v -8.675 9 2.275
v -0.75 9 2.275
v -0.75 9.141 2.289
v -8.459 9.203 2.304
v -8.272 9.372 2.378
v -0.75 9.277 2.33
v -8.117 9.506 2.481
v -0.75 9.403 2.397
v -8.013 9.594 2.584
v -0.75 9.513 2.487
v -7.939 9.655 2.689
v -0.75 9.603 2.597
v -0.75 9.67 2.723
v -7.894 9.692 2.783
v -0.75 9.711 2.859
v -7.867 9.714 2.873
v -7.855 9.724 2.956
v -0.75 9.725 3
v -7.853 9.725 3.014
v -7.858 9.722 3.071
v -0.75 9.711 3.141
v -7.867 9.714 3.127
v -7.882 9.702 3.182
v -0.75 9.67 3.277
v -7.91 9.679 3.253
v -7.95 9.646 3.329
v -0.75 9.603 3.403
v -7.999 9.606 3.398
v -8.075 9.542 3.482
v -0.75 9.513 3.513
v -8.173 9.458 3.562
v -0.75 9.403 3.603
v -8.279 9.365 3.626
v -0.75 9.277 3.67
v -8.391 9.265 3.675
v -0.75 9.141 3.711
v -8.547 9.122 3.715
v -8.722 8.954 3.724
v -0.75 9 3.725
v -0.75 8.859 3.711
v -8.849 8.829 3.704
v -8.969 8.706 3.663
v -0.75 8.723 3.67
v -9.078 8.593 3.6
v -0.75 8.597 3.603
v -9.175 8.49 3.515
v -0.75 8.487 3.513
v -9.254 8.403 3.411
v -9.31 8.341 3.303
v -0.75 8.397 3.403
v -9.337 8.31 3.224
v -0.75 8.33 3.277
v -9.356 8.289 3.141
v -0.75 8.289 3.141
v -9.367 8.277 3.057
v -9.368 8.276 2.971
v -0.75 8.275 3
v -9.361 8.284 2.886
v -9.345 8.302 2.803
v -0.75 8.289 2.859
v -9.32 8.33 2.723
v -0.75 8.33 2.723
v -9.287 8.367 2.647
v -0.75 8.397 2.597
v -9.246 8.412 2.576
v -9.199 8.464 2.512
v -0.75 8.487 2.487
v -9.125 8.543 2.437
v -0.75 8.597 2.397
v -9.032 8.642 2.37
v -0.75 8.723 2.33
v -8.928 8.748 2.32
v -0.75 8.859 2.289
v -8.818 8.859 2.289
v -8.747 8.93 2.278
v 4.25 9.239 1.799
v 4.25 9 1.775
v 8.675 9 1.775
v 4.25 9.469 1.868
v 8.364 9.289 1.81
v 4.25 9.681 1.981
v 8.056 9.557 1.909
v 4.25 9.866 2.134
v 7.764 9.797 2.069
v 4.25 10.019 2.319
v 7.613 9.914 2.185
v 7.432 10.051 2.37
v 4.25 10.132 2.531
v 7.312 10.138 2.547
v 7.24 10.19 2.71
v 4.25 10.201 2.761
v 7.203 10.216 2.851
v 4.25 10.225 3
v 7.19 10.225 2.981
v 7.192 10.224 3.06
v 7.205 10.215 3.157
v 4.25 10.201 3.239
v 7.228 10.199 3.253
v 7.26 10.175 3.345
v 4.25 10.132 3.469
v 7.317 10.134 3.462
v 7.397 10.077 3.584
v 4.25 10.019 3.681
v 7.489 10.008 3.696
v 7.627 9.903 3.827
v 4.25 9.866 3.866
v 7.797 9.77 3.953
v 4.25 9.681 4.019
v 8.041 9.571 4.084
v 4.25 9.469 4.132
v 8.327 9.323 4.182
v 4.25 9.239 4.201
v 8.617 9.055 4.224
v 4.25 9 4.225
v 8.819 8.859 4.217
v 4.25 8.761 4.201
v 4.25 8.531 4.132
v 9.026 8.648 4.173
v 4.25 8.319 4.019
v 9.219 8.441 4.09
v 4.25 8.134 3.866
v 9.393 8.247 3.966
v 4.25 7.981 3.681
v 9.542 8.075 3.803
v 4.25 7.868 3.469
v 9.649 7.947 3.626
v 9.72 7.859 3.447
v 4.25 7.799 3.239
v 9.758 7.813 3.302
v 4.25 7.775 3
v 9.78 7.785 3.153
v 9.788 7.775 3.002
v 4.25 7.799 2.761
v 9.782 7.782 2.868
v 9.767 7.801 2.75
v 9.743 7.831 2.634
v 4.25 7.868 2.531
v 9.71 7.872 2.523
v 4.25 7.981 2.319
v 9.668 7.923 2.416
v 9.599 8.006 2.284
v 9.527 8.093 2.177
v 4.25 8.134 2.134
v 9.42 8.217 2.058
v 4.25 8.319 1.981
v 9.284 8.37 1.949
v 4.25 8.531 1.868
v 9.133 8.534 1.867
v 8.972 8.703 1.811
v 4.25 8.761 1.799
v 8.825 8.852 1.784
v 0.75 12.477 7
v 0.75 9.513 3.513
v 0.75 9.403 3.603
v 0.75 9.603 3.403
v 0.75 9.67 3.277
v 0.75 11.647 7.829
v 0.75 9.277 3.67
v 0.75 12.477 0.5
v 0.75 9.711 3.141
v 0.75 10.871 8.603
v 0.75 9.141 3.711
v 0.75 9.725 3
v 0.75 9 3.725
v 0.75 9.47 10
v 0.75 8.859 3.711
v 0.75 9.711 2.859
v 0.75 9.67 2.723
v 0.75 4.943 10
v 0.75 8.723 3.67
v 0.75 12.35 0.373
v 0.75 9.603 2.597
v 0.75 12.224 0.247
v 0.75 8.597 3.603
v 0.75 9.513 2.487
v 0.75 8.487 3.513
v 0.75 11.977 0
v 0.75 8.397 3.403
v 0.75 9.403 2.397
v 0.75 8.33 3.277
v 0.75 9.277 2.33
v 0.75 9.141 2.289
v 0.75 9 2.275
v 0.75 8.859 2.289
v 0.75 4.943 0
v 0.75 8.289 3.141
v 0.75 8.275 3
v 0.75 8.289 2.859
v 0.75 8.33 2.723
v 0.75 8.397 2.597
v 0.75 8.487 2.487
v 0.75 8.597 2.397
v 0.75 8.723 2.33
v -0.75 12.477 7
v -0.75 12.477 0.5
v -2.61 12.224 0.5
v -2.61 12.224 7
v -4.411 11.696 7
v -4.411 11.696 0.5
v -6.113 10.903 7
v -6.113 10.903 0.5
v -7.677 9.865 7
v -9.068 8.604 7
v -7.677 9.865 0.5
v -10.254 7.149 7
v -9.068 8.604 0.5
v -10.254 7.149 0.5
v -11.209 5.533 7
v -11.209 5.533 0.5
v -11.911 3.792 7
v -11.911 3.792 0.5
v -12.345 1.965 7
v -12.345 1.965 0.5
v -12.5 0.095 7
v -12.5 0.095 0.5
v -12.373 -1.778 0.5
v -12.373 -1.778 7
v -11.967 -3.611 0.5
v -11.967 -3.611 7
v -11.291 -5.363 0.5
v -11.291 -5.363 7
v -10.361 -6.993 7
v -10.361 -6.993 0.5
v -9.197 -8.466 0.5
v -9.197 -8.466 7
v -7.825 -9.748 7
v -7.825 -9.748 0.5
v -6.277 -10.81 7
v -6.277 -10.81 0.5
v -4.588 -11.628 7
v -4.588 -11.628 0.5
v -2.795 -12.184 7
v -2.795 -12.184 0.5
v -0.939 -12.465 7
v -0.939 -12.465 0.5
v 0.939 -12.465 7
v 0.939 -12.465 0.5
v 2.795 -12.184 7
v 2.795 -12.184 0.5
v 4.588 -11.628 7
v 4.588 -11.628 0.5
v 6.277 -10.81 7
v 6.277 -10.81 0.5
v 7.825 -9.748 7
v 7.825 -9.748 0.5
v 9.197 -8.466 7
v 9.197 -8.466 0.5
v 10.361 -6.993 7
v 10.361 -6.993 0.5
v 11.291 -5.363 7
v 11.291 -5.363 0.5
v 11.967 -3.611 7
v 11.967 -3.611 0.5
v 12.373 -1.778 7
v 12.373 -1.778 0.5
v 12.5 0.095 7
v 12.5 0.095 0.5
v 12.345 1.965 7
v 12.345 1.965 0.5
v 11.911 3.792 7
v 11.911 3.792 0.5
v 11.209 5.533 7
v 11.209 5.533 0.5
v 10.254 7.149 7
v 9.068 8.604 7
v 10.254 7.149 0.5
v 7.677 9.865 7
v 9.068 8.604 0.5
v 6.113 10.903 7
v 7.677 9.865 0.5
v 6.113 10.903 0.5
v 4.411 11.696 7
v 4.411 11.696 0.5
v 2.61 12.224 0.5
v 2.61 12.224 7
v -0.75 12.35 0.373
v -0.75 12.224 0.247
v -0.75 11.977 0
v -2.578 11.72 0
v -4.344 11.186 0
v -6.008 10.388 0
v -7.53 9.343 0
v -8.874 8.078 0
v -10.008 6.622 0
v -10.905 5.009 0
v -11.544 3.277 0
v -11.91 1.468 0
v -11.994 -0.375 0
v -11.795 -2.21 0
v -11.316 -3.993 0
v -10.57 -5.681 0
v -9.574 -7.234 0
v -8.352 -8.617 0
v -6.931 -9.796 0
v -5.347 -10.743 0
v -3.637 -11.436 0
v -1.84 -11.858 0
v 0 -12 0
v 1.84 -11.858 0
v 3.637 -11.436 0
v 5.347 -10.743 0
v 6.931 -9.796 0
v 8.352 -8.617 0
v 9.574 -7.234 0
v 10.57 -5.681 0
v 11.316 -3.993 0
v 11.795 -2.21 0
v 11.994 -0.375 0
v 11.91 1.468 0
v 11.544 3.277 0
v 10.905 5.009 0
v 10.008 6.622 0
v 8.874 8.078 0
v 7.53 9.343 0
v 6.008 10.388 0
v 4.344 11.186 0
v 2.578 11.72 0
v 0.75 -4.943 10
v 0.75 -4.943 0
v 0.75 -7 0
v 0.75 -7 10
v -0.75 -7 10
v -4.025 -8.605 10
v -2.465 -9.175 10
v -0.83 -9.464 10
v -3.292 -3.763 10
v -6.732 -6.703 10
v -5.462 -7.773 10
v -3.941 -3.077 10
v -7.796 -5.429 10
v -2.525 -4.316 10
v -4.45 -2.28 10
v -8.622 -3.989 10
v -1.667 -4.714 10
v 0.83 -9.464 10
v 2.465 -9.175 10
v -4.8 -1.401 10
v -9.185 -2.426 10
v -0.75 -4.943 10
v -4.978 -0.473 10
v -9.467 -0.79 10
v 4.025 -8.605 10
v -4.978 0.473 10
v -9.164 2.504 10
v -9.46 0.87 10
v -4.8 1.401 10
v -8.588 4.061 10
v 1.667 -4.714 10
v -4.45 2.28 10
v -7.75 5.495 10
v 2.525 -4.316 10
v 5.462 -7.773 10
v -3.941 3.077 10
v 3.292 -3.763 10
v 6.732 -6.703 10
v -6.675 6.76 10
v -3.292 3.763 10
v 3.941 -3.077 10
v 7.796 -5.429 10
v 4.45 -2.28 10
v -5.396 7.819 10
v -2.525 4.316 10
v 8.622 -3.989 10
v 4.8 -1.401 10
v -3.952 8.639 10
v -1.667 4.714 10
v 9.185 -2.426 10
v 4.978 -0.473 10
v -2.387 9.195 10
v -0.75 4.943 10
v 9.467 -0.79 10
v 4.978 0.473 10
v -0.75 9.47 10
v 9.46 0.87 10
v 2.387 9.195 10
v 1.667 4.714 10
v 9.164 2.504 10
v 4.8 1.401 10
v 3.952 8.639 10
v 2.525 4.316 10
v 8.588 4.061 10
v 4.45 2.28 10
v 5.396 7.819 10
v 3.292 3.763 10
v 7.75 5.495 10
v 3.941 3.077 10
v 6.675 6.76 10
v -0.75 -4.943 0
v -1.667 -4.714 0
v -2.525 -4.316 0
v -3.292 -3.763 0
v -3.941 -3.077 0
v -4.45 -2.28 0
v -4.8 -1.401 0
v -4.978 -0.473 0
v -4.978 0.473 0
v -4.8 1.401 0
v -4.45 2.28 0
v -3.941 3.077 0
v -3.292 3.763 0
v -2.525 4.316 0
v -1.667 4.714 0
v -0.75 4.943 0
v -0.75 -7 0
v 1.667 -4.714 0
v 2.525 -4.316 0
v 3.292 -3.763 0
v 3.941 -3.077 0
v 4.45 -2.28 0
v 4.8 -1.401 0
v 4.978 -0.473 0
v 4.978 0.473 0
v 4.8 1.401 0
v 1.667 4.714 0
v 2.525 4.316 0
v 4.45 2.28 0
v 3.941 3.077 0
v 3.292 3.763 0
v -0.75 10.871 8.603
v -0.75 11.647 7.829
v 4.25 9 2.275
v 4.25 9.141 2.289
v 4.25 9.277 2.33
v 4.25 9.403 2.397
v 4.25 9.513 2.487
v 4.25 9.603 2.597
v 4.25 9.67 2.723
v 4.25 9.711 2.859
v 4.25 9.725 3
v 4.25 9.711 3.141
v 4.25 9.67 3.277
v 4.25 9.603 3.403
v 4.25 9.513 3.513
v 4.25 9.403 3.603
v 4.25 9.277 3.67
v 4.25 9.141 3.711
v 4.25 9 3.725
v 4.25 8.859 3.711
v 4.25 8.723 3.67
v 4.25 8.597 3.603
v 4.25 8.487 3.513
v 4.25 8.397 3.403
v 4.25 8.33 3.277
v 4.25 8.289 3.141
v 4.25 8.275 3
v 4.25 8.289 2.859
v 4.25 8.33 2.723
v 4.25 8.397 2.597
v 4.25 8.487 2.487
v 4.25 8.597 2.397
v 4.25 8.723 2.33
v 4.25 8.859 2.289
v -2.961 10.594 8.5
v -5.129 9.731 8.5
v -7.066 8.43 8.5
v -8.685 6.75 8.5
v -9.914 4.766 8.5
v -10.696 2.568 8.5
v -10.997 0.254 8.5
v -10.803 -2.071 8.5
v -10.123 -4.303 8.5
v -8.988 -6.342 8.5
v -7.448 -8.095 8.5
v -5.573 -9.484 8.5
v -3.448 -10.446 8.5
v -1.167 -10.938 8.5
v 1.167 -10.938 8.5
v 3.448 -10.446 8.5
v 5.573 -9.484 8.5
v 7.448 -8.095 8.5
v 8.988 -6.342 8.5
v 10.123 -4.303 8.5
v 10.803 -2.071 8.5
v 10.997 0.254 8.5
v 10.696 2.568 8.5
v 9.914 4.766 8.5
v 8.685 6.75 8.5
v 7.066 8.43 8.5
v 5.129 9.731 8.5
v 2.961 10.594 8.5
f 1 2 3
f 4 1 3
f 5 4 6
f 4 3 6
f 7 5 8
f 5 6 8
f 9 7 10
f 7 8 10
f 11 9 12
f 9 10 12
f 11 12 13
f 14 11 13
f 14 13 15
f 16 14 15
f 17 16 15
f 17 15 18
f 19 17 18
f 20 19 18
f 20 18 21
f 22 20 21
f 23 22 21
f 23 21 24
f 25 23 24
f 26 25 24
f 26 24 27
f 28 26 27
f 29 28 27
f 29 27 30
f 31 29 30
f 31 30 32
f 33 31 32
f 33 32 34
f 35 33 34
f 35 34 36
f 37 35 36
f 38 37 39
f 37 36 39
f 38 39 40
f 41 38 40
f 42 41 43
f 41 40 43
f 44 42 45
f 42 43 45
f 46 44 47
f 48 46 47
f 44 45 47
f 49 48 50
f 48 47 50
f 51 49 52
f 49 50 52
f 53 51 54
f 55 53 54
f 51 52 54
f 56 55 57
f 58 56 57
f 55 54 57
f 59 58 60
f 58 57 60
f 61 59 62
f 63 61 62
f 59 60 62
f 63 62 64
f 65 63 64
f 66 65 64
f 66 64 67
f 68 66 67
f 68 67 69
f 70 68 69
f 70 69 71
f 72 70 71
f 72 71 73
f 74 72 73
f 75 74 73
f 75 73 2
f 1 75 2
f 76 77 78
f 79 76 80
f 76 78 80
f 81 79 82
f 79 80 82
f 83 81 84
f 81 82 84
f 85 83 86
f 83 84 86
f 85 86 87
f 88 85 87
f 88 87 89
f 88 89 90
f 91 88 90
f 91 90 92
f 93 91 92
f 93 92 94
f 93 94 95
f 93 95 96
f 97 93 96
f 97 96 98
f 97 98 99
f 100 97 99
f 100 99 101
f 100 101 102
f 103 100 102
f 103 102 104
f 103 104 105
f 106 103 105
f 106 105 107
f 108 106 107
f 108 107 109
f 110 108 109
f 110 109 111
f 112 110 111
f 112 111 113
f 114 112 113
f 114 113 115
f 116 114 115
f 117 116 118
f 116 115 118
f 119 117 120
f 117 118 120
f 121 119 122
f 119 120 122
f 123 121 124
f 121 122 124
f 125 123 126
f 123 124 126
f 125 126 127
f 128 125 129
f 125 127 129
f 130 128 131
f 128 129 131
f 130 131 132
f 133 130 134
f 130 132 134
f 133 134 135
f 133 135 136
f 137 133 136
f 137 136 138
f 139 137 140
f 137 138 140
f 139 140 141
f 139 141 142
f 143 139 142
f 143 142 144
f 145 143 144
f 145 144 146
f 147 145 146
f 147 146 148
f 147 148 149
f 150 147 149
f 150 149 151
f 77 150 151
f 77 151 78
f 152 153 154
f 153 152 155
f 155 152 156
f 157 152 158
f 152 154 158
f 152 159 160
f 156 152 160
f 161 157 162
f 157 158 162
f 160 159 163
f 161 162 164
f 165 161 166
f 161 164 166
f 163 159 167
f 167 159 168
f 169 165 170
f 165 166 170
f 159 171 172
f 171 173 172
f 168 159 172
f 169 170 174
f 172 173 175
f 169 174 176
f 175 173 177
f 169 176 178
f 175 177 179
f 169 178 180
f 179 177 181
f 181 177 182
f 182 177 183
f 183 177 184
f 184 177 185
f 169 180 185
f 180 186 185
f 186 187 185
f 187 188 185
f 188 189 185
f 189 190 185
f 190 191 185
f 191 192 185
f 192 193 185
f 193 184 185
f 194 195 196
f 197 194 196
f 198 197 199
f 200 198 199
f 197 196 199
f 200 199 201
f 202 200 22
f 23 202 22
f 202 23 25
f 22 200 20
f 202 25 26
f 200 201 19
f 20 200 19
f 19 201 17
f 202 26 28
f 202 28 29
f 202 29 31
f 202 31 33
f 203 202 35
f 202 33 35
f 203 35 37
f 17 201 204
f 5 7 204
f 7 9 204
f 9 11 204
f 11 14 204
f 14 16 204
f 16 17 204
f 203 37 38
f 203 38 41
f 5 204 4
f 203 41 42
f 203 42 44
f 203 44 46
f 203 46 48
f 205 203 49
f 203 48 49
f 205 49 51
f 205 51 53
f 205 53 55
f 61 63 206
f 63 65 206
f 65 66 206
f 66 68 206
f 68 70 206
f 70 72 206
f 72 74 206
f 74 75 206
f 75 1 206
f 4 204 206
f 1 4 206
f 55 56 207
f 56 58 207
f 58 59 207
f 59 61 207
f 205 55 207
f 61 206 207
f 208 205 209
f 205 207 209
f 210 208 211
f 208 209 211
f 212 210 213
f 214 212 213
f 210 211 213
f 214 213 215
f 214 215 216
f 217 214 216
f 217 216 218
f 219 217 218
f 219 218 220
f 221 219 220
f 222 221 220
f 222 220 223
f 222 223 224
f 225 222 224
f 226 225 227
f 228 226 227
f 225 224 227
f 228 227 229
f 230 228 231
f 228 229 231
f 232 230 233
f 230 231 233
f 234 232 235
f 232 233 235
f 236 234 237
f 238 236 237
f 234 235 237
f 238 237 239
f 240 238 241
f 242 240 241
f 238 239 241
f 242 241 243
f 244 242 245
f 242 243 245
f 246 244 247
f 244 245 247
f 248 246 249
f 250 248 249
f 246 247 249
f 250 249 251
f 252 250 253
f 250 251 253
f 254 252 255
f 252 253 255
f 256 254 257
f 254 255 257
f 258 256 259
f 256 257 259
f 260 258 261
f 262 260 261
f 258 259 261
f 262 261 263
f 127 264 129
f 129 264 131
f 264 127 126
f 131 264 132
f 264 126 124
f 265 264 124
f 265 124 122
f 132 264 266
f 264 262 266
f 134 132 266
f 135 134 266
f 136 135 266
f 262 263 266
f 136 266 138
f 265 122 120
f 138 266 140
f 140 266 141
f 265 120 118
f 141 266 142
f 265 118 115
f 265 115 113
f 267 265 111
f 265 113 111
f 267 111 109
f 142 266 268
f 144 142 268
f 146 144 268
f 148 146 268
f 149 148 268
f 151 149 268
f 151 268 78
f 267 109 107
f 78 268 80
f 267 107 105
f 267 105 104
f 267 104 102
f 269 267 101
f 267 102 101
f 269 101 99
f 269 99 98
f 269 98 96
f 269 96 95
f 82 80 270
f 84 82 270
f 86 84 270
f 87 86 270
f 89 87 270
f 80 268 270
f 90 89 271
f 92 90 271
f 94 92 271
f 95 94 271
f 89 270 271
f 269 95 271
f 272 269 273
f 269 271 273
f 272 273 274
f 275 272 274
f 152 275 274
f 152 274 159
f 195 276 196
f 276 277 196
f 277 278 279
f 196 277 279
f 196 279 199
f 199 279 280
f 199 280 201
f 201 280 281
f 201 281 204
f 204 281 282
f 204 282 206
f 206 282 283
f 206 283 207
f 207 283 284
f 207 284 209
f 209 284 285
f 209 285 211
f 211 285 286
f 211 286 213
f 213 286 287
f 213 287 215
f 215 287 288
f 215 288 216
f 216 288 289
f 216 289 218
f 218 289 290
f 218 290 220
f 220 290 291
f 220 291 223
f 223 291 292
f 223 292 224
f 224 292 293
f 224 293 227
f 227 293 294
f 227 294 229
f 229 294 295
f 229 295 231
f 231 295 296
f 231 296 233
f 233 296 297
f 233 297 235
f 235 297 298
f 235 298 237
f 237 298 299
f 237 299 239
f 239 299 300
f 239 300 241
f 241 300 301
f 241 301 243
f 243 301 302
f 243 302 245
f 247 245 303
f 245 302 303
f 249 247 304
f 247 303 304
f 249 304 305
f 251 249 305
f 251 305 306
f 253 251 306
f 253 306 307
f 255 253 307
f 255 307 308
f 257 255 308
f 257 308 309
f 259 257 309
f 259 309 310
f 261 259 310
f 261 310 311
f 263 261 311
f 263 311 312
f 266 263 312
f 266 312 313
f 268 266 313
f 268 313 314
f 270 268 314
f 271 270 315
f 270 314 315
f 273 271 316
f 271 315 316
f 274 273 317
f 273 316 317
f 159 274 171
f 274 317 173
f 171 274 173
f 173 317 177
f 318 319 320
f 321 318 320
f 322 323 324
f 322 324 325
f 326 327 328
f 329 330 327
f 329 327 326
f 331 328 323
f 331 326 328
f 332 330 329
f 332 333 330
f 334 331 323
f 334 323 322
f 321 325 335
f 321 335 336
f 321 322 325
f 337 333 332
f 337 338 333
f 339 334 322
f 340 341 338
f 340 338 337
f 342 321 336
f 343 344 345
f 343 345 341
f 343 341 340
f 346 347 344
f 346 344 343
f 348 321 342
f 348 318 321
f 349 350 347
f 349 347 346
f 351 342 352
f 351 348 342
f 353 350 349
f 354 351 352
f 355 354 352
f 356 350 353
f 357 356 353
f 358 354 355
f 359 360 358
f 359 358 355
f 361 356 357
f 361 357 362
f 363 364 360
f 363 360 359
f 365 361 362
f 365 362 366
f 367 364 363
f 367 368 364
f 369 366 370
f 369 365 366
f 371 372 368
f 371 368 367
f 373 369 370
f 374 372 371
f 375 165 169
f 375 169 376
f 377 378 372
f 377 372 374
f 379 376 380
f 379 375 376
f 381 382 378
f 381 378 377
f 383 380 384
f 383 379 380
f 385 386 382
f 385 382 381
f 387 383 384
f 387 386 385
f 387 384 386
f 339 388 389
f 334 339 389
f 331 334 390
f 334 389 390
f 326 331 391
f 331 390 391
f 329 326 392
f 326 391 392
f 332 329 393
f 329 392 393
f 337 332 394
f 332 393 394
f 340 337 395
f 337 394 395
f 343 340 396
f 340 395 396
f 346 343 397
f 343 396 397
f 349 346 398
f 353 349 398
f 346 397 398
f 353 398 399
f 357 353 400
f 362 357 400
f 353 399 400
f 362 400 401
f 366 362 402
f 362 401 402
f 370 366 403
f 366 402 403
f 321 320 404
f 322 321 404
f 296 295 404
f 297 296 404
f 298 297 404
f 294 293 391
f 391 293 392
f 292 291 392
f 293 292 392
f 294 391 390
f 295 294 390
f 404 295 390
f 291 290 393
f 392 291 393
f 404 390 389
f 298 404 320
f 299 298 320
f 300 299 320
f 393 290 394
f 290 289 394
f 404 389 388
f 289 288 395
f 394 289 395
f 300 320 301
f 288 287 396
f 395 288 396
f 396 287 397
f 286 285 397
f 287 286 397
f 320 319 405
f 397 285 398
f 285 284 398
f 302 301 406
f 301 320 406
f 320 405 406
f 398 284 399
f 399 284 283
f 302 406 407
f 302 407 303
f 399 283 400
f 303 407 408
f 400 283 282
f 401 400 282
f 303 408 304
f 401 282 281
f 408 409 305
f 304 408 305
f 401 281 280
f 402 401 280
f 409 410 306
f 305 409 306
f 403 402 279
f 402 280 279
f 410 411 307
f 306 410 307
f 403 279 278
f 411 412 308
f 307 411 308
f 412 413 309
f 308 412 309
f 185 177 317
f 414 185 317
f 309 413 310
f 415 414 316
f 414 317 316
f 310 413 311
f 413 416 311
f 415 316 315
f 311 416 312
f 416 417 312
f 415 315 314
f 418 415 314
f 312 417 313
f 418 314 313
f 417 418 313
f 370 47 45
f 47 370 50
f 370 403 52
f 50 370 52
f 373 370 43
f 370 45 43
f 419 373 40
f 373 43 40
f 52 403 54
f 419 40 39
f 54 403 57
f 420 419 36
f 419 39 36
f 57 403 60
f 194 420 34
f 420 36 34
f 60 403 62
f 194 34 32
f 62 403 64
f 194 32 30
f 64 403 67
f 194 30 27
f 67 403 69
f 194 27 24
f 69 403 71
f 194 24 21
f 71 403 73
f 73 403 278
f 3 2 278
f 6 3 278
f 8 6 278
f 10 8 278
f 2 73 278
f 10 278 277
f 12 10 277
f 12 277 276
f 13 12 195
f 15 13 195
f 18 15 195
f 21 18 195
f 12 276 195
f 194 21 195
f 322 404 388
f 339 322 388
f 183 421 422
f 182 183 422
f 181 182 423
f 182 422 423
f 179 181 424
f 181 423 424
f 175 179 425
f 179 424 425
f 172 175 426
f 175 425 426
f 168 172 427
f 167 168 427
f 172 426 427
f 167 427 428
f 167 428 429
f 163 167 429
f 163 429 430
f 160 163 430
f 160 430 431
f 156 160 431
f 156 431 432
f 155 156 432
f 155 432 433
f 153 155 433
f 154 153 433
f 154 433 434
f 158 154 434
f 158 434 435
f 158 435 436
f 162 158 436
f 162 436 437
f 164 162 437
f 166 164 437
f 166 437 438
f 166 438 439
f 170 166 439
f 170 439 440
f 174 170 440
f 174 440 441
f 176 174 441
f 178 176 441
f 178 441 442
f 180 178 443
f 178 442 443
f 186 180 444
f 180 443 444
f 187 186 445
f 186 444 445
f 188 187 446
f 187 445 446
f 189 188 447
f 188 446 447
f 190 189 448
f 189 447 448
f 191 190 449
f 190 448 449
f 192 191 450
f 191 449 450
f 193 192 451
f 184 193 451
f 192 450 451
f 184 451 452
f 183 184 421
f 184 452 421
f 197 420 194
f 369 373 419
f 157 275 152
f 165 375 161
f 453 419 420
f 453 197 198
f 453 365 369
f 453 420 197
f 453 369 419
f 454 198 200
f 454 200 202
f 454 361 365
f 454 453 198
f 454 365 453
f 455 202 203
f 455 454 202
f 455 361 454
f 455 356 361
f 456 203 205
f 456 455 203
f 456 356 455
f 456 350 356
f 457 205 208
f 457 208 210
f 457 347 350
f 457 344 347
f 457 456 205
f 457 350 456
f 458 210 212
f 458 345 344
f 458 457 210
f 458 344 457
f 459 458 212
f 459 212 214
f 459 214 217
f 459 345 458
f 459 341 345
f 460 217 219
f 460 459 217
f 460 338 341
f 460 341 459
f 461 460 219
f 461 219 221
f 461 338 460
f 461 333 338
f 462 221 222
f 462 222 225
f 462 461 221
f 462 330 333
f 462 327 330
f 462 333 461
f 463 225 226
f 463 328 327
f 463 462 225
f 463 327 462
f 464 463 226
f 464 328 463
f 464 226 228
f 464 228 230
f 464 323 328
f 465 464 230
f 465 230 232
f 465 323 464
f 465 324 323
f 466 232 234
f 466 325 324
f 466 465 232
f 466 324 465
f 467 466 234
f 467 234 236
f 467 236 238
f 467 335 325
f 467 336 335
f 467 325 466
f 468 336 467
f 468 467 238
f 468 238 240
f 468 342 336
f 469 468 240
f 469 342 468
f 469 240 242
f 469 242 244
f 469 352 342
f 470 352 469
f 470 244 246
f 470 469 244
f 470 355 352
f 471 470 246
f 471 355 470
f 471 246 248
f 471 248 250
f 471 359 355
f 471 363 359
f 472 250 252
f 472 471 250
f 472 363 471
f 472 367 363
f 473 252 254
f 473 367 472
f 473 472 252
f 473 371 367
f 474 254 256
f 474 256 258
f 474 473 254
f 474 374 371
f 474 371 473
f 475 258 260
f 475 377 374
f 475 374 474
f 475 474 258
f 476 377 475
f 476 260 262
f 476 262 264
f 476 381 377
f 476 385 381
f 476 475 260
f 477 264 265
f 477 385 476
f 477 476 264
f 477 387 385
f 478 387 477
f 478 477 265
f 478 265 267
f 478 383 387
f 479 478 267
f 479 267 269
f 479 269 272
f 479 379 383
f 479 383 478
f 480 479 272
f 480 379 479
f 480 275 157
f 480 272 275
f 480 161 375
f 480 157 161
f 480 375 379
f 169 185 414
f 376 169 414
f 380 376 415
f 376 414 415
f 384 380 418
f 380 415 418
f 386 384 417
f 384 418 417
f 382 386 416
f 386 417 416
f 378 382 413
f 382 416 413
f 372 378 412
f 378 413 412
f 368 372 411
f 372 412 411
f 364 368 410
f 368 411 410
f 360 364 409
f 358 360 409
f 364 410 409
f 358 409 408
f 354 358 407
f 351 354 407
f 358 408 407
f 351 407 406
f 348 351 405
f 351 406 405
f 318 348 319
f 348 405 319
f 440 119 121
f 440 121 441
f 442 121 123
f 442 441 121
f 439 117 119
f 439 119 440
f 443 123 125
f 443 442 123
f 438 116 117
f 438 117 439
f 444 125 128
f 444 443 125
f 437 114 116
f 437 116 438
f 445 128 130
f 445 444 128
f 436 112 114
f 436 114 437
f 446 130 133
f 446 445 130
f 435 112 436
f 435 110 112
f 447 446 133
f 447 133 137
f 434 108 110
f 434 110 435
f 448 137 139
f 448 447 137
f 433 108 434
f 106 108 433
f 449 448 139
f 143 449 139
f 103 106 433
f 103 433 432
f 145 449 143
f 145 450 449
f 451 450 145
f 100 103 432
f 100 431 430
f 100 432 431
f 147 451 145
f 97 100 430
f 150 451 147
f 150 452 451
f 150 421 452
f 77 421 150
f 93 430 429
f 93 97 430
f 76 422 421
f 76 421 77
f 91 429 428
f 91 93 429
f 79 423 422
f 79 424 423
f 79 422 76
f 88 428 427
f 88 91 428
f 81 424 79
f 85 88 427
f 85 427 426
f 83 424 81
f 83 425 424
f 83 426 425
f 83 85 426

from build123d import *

# Parameters (mm, degrees)
BOSS_EXTRUDE1_DEPTH = 10
CHAMFER1_SIZE       = 3
CHAMFER2_SIZE       = 0.5
SKETCH22_R          = 1.225
CUT_EXTRUDE1_DEPTH  = 10
SKETCH23_R          = 0.725
CUT_EXTRUDE2_DEPTH  = 27.7500001


with BuildPart() as part:
    # Sketch1 → Boss-Extrude1 (new body)
    with BuildSketch(Plane.XY):
        with BuildLine():
            Line((-0.75, 4.943429983), (-0.75, 12.477479713))
            ThreePointArc((-0.75, 12.477479713), (0, -12.5), (0.75, 12.477479713))
            Line((0.75, 12.477479713), (0.75, 4.943429983))
            ThreePointArc((0.75, 4.943429983), (5, 0), (0.75, -4.943429983))
            Line((0.75, -4.943429983), (0.75, -7))
            Line((0.75, -7), (-0.75, -7))
            Line((-0.75, -7), (-0.75, -4.943429983))
            ThreePointArc((-0.75, -4.943429983), (-5, 0), (-0.75, 4.943429983))
        make_face()
    extrude(amount=BOSS_EXTRUDE1_DEPTH)

    # Chamfer1
    chamfer1_edges = [part.edges().sort_by_distance(p)[0] for p in [
        (0, -12.5, 10),
    ]]
    chamfer(chamfer1_edges, length=CHAMFER1_SIZE)

    # Chamfer2
    chamfer2_edges = [part.edges().sort_by_distance(p)[0] for p in [
        (0, -12.5, 0),
    ]]
    chamfer(chamfer2_edges, length=CHAMFER2_SIZE)

    # Sketch22 → Cut-Extrude1 (cut)
    with BuildSketch(Plane(origin=(14.25, 0, 0), x_dir=(0, 0, -1), z_dir=(1, 0, 0))):
        with Locations((-3, 9)):
            Circle(SKETCH22_R)
    extrude(amount=-CUT_EXTRUDE1_DEPTH, mode=Mode.SUBTRACT)

    # Sketch23 → Cut-Extrude2 (cut, through all)
    with BuildSketch(Plane(origin=(14.25, 0, 0), x_dir=(0, 0, -1), z_dir=(1, 0, 0))):
        with Locations((-3, 9)):
            Circle(SKETCH23_R)
    extrude(amount=-CUT_EXTRUDE2_DEPTH, mode=Mode.SUBTRACT)


solid = part.part
